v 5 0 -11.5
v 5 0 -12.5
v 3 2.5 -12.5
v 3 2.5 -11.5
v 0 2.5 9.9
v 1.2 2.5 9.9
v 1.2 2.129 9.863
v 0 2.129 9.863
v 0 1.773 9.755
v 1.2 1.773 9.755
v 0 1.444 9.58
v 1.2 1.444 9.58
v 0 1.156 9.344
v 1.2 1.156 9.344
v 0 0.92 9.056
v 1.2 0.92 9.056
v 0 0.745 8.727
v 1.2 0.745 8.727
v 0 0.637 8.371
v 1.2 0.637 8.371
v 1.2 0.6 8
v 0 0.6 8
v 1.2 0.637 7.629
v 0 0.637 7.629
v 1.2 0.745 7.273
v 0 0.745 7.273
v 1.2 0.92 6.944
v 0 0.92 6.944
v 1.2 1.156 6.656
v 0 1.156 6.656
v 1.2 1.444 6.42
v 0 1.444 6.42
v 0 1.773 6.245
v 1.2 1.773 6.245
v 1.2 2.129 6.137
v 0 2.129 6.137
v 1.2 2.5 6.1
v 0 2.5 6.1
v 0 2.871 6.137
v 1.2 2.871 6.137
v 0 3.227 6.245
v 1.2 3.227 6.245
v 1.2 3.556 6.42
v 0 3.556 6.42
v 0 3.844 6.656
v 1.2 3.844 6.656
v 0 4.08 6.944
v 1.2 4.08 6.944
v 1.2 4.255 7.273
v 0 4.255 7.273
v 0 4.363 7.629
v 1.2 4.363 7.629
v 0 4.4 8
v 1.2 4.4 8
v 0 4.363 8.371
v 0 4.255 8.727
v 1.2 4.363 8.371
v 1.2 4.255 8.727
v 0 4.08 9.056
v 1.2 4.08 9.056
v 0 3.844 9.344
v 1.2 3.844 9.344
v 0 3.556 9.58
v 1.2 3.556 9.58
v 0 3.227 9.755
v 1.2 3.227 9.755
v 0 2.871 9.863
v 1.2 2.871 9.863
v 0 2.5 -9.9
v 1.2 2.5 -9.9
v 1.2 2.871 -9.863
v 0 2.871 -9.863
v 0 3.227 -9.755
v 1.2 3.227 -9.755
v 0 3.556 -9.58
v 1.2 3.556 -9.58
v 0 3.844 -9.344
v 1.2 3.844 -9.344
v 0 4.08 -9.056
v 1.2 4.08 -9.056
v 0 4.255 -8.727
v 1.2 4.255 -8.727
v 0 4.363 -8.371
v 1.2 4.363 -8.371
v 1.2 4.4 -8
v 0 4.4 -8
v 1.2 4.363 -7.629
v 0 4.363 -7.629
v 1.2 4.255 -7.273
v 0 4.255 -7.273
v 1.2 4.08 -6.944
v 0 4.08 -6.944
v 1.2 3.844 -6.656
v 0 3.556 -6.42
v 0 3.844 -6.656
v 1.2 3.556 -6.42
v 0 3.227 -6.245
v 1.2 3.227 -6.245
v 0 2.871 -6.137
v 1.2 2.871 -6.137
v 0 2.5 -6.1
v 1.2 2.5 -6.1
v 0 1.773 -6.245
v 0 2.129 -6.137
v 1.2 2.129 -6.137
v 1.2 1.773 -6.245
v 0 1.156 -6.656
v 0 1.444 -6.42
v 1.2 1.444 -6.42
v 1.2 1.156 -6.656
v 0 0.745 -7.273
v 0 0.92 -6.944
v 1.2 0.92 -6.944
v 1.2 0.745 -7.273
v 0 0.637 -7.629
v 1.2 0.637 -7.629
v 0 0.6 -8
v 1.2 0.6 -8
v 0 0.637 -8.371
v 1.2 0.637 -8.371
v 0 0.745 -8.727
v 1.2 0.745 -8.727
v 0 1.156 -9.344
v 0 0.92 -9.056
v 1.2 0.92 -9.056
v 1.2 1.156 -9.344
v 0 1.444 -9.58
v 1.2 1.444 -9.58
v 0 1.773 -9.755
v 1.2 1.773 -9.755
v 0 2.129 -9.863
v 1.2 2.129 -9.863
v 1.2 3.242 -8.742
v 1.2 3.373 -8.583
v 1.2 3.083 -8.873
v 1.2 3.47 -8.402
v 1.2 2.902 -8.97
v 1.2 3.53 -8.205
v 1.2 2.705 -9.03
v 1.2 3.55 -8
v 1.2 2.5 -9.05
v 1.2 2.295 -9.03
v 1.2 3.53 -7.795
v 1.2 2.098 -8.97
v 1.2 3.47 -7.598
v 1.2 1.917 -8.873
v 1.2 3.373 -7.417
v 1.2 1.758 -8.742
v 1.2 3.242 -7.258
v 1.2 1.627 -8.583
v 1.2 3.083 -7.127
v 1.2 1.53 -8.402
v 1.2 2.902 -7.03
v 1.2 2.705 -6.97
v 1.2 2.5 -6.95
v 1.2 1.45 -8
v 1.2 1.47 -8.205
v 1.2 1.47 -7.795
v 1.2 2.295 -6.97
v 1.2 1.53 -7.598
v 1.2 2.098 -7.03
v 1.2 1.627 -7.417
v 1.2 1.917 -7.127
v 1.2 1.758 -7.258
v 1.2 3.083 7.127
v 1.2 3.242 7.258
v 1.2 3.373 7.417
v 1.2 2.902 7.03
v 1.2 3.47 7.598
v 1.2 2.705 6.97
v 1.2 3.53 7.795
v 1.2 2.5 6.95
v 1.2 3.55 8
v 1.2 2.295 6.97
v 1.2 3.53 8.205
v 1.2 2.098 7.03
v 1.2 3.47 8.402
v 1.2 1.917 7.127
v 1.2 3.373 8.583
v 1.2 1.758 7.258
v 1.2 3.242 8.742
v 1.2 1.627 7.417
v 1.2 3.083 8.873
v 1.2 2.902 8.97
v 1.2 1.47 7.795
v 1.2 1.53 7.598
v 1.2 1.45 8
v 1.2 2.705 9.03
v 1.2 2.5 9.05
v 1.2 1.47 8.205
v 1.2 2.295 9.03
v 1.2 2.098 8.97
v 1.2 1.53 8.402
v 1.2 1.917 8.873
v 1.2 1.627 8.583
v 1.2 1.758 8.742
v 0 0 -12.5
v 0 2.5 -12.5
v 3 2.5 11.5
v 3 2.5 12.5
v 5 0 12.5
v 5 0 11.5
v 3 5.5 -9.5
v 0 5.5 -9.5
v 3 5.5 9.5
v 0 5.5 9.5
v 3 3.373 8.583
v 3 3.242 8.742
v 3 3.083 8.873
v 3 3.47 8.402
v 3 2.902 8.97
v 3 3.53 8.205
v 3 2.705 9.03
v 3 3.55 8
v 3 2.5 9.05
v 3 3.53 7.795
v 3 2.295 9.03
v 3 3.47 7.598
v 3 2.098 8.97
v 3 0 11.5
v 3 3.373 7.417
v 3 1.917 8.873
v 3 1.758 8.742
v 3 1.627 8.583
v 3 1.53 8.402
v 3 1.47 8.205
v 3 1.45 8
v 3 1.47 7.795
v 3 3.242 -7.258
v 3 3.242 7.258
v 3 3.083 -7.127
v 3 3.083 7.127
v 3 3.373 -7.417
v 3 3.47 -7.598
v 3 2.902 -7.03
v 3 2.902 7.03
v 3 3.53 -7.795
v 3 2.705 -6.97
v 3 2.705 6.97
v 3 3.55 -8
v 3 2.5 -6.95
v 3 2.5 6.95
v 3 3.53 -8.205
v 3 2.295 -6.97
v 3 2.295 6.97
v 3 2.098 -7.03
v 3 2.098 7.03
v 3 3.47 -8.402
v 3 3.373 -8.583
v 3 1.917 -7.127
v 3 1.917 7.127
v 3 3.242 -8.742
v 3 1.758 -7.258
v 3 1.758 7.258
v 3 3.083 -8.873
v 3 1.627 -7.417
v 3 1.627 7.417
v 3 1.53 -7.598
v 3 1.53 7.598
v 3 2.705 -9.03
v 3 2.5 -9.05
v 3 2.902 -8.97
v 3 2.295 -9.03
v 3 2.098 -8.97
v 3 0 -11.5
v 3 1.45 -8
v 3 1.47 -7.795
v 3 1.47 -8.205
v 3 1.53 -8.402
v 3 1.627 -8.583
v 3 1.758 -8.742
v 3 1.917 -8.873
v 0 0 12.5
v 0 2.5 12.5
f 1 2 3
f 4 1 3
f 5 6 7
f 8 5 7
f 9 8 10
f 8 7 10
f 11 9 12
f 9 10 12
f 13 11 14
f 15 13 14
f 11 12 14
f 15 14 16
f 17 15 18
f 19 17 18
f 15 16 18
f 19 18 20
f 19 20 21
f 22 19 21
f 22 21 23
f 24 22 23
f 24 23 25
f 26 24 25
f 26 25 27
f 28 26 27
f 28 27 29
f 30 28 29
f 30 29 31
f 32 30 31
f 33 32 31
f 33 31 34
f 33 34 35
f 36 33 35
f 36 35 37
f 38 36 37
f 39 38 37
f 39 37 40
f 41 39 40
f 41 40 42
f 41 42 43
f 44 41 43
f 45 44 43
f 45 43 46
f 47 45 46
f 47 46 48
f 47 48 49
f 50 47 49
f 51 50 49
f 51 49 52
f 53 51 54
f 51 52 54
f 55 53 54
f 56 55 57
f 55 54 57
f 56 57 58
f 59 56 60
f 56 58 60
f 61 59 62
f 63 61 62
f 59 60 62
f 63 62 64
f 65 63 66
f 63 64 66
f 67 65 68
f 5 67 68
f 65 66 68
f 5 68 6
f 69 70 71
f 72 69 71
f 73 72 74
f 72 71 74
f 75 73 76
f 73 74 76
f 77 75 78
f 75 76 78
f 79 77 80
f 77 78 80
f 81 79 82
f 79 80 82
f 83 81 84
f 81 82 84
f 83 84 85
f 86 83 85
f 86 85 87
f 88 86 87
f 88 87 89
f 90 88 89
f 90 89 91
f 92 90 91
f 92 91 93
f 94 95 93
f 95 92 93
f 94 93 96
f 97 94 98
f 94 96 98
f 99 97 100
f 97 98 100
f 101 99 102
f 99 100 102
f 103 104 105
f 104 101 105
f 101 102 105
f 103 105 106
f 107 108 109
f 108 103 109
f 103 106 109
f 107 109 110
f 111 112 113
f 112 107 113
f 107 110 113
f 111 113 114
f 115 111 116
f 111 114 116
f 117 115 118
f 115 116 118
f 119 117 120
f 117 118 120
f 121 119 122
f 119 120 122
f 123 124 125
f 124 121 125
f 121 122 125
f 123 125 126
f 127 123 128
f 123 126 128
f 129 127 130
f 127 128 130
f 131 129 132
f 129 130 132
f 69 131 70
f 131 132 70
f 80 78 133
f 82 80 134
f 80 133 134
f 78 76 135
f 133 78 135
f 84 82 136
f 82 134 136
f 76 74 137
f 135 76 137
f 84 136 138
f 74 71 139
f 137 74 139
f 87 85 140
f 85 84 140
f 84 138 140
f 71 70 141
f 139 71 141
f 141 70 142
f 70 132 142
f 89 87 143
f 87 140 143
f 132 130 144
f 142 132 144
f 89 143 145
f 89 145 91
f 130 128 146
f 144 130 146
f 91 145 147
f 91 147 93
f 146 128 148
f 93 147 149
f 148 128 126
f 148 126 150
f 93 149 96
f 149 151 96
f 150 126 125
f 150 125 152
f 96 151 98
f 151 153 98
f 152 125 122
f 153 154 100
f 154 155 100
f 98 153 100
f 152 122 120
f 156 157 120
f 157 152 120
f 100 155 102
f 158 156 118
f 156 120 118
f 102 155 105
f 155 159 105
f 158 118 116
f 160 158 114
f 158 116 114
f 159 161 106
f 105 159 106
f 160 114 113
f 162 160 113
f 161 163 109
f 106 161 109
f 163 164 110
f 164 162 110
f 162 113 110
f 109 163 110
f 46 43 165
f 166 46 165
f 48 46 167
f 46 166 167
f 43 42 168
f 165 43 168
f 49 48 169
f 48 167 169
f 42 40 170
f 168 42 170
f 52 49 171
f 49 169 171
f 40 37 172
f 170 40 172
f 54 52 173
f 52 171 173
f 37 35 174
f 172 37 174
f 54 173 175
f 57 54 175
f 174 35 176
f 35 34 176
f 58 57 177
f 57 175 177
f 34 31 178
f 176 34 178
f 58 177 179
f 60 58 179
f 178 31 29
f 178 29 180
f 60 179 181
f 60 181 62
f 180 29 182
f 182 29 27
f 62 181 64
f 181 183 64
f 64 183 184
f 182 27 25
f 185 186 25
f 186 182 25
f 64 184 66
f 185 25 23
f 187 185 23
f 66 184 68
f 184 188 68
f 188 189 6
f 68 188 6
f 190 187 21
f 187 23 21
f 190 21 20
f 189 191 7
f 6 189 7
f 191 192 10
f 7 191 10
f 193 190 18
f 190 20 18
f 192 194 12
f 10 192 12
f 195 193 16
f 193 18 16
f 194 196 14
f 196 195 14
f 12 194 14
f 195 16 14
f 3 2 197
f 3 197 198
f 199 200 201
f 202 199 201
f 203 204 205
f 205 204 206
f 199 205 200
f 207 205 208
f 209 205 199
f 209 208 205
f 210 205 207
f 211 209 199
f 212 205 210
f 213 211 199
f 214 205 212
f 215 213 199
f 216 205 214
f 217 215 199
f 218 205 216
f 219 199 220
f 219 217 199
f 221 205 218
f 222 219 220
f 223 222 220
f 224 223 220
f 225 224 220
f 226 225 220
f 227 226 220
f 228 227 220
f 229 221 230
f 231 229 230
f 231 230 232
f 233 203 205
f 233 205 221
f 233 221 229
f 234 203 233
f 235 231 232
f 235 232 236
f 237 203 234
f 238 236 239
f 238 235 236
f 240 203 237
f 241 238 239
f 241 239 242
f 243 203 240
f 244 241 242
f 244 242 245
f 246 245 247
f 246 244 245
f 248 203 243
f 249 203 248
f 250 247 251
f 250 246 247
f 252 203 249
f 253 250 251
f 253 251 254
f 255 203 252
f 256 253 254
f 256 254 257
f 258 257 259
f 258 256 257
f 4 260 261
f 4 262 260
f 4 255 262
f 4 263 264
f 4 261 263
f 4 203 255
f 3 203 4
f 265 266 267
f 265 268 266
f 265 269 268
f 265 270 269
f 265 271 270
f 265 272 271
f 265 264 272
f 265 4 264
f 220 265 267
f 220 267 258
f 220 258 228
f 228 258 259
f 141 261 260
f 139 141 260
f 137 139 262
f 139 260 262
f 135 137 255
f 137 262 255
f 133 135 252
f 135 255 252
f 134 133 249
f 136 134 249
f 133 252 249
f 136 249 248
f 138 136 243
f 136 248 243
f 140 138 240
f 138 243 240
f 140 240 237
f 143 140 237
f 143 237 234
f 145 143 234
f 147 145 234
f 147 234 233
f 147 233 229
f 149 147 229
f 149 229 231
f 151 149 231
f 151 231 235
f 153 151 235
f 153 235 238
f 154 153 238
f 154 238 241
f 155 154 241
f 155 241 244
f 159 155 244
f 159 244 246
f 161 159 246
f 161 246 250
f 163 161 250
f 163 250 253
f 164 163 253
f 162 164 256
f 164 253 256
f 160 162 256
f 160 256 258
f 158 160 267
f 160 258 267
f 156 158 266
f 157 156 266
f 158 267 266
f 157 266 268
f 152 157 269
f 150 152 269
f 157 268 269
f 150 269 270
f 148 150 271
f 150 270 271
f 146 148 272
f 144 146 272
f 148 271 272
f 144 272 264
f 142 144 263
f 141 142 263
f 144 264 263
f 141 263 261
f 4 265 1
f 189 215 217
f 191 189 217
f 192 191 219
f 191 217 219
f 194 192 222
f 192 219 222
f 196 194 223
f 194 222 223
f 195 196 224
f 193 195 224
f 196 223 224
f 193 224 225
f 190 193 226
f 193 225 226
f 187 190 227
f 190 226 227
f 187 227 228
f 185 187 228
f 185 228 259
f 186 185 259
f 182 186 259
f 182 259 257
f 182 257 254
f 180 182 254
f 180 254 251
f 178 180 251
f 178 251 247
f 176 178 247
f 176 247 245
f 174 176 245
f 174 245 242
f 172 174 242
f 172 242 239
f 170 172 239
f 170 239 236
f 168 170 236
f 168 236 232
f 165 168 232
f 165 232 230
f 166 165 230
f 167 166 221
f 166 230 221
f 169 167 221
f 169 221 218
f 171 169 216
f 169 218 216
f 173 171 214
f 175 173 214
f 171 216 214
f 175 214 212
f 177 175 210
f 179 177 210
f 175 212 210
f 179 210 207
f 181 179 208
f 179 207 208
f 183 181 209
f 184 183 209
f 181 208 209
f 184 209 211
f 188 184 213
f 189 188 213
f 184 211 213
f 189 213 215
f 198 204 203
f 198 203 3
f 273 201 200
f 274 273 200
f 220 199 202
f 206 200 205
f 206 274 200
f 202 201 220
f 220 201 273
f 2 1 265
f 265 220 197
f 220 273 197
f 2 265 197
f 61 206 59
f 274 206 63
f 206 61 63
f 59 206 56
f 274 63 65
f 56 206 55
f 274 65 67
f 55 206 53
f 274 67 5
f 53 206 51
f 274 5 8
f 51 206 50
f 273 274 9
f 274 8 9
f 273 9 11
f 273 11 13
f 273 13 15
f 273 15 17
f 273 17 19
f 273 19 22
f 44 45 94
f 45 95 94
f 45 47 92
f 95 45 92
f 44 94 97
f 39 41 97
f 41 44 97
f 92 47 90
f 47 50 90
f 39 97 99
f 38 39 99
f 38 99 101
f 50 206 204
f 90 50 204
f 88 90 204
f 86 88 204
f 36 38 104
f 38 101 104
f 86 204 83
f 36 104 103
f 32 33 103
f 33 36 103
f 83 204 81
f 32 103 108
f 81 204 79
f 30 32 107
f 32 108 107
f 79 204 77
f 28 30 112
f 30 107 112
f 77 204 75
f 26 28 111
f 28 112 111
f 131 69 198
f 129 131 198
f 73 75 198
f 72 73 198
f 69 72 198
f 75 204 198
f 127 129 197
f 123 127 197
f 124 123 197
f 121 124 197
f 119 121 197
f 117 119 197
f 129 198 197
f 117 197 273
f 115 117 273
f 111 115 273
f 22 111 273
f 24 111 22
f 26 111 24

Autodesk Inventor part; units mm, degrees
ref_plane "YZ Plane" through (0, 0, 0) normal (1, 0, 0) x (0, 1, 0)
ref_plane "XZ Plane" through (0, 0, 0) normal (0, 1, 0) x (-1, 0, 0)
ref_plane "XY Plane" through (0, 0, 0) normal (0, 0, 1) x (1, 0, 0)
sketch "Sketch1" plane through (0, 0, 0) normal (1, 0, 0) x (0, 1, 0)
  line L0 (0, 0) -> (0, 8)
  line L1 (0, 8) -> (2.5, 8)
  circle A0 centre (2.5, 8) radius 1.05
  circle A1 centre (2.5, 8) radius 1.9
  dimension "d1" = 8
  dimension "d2" = 2.5
  dimension "d3" = 2.1
  dimension "d7" = 3.8
sketch "Sketch4" plane through (0, 0, 0) normal (1, 0, 0) x (0, 1, 0)
  line L0 (0, 0) -> (0, 3.5)
  line L1 (0, 3.5) -> (0, 12.5)
  line L2 (0, 12.5) -> (2.5, 12.5)
  line L3 (2.5, 12.5) -> (5.5, 12.5)
  line L4 (5.5, 12.5) -> (5.5, 9.5)
  line L5 (2.5, 12.5) -> (5.5, 9.5)
  line L6 (0, 0) -> (5.5, 0)
  line L7 (5.5, 0) -> (5.5, 9.5)
  dimension "d32" = 3.5
  dimension "d33" = 9
  dimension "d35" = 2.5
  dimension "d37" = 3
  dimension "d38" = 3
extrude "Extrusion3" add sketch "Sketch4" along normal blind 3 contours L0 L1 L2 L5 L7 L6
sketch "Sketch9" plane through (3, 0, 0) normal (1, 0, 0) x (0, 0, -1)
  line L0 (0, 0) -> (-3.5, 0)
  line L1 (-12.5, 0) -> (0, 0) projected
  line L2 (-3.5, 0) -> (-4.5, 0)
  line L3 (-3.5, 0) -> (-3.5, 2.5)
  line L4 (-3.5, 2.5) -> (-4.5, 2.5)
  line L5 (-4.5, 2.5) -> (-4.5, 0)
  line L6 (-4.5, 0) -> (-11.5, 0)
  line L7 (-11.5, 2.5) -> (-12.5, 2.5)
  line L8 (-11.5, 2.5) -> (-11.5, 0)
  line L9 (-12.5, 2.5) -> (-12.5, 0)
  line L10 (-12.5, 0) -> (-11.5, 0)
  dimension "d70" = 3.5
  dimension "d71" = 1
  dimension "d72" = 1
  dimension "d73" = 7
  dimension "d74" = 2.5
extrude "Extrusion4" add sketch "Sketch9" along normal blind 2 contours L9 L7 L8 L1
sketch "Sketch10" plane through (0, 0, 12.5) normal (0, 0, 1) x (1, 0, 0)
  line L0 (3, 0) -> (3, 5.5) projected
  line L1 (3, 0) -> (5, 0)
  line L2 (3, 0) -> (3, 2.5)
  line L3 (3, 2.5) -> (5, 2.5)
  line L4 (5, 2.5) -> (5, 0)
  line L5 (3, 2.5) -> (5, 0)
  point P0 (0, 0)
  dimension "d110" = 2
  dimension "d111" = 2.5
extrude "Extrusion9" cut sketch "Sketch10" against normal blind 1 contours L3 L4 L5
hole "Hole5" at (0, 2.5, 8) direction (1, 0, 0) diameter 3.8 depth 1.2
hole "Hole6" at (0, 2.5, 8) direction (1, 0, 0) diameter 2.1 end through all
mirror "Mirror3" about plane through (0, 0, 0) normal (0, 0, 1) of "Extrusion3", "Extrusion4", "Extrusion9", "Hole5", "Hole6"
equation "\"d38\" = d37"
equation "\"d90\" = d7"
equation "\"d97\" = d3"
properties part number "holes"
